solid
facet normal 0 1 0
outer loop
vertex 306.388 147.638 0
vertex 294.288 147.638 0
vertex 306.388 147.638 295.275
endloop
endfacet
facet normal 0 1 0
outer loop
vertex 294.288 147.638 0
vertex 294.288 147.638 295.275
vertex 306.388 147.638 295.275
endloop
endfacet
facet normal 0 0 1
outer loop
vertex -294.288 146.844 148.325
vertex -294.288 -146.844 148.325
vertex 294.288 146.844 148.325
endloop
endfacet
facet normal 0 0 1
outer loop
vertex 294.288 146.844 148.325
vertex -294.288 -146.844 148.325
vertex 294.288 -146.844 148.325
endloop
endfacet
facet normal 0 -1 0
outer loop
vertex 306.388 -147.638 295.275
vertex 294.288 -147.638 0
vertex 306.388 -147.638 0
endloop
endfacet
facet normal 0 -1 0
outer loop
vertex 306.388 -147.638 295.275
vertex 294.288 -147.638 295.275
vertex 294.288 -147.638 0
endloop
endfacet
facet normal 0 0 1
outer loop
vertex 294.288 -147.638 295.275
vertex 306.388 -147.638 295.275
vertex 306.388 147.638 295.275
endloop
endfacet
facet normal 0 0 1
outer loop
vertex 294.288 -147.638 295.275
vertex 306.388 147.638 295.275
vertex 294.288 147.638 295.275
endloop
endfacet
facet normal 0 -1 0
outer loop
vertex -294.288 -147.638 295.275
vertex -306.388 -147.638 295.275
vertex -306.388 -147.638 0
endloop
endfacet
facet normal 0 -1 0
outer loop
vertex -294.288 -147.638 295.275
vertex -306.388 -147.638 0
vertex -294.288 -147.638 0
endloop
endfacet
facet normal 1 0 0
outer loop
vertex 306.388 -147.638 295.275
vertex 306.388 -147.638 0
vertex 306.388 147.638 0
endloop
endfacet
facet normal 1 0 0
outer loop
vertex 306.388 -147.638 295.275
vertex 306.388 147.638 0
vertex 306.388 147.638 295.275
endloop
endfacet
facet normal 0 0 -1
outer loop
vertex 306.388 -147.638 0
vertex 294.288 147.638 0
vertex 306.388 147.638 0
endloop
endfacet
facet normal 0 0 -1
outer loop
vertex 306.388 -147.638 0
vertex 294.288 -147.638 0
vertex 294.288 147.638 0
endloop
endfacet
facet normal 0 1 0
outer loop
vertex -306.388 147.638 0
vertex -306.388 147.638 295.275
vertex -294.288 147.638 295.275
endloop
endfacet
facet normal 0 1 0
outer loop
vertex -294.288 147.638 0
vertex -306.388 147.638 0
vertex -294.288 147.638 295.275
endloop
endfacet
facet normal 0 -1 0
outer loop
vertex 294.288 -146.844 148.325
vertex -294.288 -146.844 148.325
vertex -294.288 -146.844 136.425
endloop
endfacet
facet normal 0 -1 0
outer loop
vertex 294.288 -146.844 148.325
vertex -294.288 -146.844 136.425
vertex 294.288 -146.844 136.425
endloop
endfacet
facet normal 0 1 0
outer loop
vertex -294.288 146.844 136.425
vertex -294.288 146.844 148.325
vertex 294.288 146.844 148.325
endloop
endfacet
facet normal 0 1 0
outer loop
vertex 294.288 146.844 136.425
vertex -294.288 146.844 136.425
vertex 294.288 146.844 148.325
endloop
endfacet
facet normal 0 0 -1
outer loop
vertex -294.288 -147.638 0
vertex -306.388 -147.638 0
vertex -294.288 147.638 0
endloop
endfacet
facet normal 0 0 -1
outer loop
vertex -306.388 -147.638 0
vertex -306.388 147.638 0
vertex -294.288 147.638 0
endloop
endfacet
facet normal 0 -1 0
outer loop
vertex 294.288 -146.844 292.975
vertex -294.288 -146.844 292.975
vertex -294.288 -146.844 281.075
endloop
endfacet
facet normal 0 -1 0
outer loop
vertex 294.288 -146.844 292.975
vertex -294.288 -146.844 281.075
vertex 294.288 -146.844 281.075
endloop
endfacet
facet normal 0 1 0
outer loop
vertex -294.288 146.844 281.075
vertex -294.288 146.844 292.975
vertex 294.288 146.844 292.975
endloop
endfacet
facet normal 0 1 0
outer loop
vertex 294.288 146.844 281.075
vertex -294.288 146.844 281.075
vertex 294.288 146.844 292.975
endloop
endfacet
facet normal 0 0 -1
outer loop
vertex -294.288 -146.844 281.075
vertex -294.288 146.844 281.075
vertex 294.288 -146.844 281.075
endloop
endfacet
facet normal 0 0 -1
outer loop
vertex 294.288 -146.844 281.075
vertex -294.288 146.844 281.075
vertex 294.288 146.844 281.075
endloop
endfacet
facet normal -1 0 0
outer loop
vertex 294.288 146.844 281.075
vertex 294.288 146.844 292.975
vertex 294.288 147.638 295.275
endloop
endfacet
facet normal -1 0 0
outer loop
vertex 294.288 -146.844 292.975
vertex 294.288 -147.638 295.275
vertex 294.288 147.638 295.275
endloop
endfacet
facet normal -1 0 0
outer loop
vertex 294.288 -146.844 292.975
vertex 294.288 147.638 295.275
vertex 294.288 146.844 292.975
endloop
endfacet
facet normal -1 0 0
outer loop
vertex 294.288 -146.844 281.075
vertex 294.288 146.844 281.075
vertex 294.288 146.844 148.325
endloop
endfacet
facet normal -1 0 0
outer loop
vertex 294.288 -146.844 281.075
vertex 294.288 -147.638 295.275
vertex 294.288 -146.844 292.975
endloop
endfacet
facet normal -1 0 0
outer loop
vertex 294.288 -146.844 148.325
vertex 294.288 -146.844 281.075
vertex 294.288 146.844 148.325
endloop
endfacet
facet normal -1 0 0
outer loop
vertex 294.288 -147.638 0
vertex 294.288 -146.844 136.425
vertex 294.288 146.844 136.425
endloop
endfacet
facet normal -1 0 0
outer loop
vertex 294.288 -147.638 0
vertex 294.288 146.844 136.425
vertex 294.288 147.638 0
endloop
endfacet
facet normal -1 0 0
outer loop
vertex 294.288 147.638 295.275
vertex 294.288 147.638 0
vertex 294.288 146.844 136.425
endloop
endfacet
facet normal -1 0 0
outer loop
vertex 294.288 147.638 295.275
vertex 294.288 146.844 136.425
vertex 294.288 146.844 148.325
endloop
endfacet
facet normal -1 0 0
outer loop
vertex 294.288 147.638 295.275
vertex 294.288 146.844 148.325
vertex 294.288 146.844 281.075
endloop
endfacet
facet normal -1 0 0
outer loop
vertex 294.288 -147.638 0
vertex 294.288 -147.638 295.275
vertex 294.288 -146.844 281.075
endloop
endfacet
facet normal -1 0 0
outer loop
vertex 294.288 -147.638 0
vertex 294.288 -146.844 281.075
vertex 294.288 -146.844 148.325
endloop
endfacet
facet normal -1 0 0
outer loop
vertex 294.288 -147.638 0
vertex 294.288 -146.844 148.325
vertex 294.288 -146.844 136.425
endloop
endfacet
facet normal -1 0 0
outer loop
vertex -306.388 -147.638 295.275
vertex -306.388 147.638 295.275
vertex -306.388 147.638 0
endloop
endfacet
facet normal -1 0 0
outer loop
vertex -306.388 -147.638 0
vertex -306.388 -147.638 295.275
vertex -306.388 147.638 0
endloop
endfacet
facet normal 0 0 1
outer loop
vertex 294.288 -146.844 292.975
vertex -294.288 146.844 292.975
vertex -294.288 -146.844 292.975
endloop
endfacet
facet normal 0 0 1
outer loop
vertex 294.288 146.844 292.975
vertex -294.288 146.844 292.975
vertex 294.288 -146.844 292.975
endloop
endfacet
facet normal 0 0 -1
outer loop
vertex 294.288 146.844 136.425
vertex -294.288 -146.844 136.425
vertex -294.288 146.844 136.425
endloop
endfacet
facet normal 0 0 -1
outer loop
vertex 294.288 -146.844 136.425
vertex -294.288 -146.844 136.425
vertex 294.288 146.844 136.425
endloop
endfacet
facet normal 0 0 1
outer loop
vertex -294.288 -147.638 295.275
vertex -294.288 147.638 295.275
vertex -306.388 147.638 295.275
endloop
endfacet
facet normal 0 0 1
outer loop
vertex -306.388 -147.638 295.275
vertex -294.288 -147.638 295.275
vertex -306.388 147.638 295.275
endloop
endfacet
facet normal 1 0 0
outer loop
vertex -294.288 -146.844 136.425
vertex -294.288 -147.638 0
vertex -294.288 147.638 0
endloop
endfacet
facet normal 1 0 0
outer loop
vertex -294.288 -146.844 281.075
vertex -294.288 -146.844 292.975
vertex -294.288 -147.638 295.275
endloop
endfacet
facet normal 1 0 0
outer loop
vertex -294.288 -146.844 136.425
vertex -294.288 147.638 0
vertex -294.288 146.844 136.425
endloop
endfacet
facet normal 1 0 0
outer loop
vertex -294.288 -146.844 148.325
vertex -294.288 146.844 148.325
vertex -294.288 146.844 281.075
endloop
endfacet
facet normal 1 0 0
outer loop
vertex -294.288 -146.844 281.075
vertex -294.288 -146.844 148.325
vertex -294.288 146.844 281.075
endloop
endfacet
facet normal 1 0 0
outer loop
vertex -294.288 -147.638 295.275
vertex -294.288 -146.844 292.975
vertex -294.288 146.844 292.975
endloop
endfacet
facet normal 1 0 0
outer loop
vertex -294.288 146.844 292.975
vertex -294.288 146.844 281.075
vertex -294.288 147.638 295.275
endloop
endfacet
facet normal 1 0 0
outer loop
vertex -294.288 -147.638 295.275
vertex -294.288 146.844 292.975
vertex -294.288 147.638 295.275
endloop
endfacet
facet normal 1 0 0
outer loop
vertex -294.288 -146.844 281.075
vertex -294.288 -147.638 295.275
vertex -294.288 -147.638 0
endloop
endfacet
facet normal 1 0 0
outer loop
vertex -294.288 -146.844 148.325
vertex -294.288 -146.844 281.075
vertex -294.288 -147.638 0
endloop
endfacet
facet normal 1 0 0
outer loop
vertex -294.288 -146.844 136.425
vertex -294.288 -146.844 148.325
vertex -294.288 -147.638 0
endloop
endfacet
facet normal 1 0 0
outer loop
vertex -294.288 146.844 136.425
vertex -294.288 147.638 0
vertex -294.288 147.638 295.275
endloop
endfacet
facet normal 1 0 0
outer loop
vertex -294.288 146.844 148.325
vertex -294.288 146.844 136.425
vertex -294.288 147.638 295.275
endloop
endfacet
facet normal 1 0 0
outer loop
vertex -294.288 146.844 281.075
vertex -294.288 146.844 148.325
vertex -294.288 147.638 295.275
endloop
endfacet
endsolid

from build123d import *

# Parameters (mm, degrees)
F1_DEPTH = 147.6375
F0_W     = 588.575
F0_H     = 11.9
F2_DEPTH = 146.84375


with BuildPart() as f1:
    # F0 (on Front) → F1 (new body, symmetric)
    with BuildSketch(Plane.XZ):
        Polygon((-306.3875, 295.275), (-306.3875, 0), (-294.2875, 0), (-294.2875, 136.425), (-294.2875, 148.325), (-294.2875, 281.075), (-294.2875, 292.975), (-294.2875, 295.275), align=None)
        Polygon((294.2875, 148.325), (294.2875, 136.425), (294.2875, 0), (306.3875, 0), (306.3875, 295.275), (294.2875, 295.275), (294.2875, 292.975), (294.2875, 281.075), align=None)
    extrude(amount=F1_DEPTH, both=True)

    # F0 (on Front) → F2 (join, symmetric)
    with BuildSketch(Plane.XZ):
        with Locations((0, 287.025)):
            Rectangle(F0_W, F0_H)
        with Locations((0, 142.375)):
            Rectangle(F0_W, F0_H)
    extrude(amount=F2_DEPTH, both=True)


solid = f1.part
